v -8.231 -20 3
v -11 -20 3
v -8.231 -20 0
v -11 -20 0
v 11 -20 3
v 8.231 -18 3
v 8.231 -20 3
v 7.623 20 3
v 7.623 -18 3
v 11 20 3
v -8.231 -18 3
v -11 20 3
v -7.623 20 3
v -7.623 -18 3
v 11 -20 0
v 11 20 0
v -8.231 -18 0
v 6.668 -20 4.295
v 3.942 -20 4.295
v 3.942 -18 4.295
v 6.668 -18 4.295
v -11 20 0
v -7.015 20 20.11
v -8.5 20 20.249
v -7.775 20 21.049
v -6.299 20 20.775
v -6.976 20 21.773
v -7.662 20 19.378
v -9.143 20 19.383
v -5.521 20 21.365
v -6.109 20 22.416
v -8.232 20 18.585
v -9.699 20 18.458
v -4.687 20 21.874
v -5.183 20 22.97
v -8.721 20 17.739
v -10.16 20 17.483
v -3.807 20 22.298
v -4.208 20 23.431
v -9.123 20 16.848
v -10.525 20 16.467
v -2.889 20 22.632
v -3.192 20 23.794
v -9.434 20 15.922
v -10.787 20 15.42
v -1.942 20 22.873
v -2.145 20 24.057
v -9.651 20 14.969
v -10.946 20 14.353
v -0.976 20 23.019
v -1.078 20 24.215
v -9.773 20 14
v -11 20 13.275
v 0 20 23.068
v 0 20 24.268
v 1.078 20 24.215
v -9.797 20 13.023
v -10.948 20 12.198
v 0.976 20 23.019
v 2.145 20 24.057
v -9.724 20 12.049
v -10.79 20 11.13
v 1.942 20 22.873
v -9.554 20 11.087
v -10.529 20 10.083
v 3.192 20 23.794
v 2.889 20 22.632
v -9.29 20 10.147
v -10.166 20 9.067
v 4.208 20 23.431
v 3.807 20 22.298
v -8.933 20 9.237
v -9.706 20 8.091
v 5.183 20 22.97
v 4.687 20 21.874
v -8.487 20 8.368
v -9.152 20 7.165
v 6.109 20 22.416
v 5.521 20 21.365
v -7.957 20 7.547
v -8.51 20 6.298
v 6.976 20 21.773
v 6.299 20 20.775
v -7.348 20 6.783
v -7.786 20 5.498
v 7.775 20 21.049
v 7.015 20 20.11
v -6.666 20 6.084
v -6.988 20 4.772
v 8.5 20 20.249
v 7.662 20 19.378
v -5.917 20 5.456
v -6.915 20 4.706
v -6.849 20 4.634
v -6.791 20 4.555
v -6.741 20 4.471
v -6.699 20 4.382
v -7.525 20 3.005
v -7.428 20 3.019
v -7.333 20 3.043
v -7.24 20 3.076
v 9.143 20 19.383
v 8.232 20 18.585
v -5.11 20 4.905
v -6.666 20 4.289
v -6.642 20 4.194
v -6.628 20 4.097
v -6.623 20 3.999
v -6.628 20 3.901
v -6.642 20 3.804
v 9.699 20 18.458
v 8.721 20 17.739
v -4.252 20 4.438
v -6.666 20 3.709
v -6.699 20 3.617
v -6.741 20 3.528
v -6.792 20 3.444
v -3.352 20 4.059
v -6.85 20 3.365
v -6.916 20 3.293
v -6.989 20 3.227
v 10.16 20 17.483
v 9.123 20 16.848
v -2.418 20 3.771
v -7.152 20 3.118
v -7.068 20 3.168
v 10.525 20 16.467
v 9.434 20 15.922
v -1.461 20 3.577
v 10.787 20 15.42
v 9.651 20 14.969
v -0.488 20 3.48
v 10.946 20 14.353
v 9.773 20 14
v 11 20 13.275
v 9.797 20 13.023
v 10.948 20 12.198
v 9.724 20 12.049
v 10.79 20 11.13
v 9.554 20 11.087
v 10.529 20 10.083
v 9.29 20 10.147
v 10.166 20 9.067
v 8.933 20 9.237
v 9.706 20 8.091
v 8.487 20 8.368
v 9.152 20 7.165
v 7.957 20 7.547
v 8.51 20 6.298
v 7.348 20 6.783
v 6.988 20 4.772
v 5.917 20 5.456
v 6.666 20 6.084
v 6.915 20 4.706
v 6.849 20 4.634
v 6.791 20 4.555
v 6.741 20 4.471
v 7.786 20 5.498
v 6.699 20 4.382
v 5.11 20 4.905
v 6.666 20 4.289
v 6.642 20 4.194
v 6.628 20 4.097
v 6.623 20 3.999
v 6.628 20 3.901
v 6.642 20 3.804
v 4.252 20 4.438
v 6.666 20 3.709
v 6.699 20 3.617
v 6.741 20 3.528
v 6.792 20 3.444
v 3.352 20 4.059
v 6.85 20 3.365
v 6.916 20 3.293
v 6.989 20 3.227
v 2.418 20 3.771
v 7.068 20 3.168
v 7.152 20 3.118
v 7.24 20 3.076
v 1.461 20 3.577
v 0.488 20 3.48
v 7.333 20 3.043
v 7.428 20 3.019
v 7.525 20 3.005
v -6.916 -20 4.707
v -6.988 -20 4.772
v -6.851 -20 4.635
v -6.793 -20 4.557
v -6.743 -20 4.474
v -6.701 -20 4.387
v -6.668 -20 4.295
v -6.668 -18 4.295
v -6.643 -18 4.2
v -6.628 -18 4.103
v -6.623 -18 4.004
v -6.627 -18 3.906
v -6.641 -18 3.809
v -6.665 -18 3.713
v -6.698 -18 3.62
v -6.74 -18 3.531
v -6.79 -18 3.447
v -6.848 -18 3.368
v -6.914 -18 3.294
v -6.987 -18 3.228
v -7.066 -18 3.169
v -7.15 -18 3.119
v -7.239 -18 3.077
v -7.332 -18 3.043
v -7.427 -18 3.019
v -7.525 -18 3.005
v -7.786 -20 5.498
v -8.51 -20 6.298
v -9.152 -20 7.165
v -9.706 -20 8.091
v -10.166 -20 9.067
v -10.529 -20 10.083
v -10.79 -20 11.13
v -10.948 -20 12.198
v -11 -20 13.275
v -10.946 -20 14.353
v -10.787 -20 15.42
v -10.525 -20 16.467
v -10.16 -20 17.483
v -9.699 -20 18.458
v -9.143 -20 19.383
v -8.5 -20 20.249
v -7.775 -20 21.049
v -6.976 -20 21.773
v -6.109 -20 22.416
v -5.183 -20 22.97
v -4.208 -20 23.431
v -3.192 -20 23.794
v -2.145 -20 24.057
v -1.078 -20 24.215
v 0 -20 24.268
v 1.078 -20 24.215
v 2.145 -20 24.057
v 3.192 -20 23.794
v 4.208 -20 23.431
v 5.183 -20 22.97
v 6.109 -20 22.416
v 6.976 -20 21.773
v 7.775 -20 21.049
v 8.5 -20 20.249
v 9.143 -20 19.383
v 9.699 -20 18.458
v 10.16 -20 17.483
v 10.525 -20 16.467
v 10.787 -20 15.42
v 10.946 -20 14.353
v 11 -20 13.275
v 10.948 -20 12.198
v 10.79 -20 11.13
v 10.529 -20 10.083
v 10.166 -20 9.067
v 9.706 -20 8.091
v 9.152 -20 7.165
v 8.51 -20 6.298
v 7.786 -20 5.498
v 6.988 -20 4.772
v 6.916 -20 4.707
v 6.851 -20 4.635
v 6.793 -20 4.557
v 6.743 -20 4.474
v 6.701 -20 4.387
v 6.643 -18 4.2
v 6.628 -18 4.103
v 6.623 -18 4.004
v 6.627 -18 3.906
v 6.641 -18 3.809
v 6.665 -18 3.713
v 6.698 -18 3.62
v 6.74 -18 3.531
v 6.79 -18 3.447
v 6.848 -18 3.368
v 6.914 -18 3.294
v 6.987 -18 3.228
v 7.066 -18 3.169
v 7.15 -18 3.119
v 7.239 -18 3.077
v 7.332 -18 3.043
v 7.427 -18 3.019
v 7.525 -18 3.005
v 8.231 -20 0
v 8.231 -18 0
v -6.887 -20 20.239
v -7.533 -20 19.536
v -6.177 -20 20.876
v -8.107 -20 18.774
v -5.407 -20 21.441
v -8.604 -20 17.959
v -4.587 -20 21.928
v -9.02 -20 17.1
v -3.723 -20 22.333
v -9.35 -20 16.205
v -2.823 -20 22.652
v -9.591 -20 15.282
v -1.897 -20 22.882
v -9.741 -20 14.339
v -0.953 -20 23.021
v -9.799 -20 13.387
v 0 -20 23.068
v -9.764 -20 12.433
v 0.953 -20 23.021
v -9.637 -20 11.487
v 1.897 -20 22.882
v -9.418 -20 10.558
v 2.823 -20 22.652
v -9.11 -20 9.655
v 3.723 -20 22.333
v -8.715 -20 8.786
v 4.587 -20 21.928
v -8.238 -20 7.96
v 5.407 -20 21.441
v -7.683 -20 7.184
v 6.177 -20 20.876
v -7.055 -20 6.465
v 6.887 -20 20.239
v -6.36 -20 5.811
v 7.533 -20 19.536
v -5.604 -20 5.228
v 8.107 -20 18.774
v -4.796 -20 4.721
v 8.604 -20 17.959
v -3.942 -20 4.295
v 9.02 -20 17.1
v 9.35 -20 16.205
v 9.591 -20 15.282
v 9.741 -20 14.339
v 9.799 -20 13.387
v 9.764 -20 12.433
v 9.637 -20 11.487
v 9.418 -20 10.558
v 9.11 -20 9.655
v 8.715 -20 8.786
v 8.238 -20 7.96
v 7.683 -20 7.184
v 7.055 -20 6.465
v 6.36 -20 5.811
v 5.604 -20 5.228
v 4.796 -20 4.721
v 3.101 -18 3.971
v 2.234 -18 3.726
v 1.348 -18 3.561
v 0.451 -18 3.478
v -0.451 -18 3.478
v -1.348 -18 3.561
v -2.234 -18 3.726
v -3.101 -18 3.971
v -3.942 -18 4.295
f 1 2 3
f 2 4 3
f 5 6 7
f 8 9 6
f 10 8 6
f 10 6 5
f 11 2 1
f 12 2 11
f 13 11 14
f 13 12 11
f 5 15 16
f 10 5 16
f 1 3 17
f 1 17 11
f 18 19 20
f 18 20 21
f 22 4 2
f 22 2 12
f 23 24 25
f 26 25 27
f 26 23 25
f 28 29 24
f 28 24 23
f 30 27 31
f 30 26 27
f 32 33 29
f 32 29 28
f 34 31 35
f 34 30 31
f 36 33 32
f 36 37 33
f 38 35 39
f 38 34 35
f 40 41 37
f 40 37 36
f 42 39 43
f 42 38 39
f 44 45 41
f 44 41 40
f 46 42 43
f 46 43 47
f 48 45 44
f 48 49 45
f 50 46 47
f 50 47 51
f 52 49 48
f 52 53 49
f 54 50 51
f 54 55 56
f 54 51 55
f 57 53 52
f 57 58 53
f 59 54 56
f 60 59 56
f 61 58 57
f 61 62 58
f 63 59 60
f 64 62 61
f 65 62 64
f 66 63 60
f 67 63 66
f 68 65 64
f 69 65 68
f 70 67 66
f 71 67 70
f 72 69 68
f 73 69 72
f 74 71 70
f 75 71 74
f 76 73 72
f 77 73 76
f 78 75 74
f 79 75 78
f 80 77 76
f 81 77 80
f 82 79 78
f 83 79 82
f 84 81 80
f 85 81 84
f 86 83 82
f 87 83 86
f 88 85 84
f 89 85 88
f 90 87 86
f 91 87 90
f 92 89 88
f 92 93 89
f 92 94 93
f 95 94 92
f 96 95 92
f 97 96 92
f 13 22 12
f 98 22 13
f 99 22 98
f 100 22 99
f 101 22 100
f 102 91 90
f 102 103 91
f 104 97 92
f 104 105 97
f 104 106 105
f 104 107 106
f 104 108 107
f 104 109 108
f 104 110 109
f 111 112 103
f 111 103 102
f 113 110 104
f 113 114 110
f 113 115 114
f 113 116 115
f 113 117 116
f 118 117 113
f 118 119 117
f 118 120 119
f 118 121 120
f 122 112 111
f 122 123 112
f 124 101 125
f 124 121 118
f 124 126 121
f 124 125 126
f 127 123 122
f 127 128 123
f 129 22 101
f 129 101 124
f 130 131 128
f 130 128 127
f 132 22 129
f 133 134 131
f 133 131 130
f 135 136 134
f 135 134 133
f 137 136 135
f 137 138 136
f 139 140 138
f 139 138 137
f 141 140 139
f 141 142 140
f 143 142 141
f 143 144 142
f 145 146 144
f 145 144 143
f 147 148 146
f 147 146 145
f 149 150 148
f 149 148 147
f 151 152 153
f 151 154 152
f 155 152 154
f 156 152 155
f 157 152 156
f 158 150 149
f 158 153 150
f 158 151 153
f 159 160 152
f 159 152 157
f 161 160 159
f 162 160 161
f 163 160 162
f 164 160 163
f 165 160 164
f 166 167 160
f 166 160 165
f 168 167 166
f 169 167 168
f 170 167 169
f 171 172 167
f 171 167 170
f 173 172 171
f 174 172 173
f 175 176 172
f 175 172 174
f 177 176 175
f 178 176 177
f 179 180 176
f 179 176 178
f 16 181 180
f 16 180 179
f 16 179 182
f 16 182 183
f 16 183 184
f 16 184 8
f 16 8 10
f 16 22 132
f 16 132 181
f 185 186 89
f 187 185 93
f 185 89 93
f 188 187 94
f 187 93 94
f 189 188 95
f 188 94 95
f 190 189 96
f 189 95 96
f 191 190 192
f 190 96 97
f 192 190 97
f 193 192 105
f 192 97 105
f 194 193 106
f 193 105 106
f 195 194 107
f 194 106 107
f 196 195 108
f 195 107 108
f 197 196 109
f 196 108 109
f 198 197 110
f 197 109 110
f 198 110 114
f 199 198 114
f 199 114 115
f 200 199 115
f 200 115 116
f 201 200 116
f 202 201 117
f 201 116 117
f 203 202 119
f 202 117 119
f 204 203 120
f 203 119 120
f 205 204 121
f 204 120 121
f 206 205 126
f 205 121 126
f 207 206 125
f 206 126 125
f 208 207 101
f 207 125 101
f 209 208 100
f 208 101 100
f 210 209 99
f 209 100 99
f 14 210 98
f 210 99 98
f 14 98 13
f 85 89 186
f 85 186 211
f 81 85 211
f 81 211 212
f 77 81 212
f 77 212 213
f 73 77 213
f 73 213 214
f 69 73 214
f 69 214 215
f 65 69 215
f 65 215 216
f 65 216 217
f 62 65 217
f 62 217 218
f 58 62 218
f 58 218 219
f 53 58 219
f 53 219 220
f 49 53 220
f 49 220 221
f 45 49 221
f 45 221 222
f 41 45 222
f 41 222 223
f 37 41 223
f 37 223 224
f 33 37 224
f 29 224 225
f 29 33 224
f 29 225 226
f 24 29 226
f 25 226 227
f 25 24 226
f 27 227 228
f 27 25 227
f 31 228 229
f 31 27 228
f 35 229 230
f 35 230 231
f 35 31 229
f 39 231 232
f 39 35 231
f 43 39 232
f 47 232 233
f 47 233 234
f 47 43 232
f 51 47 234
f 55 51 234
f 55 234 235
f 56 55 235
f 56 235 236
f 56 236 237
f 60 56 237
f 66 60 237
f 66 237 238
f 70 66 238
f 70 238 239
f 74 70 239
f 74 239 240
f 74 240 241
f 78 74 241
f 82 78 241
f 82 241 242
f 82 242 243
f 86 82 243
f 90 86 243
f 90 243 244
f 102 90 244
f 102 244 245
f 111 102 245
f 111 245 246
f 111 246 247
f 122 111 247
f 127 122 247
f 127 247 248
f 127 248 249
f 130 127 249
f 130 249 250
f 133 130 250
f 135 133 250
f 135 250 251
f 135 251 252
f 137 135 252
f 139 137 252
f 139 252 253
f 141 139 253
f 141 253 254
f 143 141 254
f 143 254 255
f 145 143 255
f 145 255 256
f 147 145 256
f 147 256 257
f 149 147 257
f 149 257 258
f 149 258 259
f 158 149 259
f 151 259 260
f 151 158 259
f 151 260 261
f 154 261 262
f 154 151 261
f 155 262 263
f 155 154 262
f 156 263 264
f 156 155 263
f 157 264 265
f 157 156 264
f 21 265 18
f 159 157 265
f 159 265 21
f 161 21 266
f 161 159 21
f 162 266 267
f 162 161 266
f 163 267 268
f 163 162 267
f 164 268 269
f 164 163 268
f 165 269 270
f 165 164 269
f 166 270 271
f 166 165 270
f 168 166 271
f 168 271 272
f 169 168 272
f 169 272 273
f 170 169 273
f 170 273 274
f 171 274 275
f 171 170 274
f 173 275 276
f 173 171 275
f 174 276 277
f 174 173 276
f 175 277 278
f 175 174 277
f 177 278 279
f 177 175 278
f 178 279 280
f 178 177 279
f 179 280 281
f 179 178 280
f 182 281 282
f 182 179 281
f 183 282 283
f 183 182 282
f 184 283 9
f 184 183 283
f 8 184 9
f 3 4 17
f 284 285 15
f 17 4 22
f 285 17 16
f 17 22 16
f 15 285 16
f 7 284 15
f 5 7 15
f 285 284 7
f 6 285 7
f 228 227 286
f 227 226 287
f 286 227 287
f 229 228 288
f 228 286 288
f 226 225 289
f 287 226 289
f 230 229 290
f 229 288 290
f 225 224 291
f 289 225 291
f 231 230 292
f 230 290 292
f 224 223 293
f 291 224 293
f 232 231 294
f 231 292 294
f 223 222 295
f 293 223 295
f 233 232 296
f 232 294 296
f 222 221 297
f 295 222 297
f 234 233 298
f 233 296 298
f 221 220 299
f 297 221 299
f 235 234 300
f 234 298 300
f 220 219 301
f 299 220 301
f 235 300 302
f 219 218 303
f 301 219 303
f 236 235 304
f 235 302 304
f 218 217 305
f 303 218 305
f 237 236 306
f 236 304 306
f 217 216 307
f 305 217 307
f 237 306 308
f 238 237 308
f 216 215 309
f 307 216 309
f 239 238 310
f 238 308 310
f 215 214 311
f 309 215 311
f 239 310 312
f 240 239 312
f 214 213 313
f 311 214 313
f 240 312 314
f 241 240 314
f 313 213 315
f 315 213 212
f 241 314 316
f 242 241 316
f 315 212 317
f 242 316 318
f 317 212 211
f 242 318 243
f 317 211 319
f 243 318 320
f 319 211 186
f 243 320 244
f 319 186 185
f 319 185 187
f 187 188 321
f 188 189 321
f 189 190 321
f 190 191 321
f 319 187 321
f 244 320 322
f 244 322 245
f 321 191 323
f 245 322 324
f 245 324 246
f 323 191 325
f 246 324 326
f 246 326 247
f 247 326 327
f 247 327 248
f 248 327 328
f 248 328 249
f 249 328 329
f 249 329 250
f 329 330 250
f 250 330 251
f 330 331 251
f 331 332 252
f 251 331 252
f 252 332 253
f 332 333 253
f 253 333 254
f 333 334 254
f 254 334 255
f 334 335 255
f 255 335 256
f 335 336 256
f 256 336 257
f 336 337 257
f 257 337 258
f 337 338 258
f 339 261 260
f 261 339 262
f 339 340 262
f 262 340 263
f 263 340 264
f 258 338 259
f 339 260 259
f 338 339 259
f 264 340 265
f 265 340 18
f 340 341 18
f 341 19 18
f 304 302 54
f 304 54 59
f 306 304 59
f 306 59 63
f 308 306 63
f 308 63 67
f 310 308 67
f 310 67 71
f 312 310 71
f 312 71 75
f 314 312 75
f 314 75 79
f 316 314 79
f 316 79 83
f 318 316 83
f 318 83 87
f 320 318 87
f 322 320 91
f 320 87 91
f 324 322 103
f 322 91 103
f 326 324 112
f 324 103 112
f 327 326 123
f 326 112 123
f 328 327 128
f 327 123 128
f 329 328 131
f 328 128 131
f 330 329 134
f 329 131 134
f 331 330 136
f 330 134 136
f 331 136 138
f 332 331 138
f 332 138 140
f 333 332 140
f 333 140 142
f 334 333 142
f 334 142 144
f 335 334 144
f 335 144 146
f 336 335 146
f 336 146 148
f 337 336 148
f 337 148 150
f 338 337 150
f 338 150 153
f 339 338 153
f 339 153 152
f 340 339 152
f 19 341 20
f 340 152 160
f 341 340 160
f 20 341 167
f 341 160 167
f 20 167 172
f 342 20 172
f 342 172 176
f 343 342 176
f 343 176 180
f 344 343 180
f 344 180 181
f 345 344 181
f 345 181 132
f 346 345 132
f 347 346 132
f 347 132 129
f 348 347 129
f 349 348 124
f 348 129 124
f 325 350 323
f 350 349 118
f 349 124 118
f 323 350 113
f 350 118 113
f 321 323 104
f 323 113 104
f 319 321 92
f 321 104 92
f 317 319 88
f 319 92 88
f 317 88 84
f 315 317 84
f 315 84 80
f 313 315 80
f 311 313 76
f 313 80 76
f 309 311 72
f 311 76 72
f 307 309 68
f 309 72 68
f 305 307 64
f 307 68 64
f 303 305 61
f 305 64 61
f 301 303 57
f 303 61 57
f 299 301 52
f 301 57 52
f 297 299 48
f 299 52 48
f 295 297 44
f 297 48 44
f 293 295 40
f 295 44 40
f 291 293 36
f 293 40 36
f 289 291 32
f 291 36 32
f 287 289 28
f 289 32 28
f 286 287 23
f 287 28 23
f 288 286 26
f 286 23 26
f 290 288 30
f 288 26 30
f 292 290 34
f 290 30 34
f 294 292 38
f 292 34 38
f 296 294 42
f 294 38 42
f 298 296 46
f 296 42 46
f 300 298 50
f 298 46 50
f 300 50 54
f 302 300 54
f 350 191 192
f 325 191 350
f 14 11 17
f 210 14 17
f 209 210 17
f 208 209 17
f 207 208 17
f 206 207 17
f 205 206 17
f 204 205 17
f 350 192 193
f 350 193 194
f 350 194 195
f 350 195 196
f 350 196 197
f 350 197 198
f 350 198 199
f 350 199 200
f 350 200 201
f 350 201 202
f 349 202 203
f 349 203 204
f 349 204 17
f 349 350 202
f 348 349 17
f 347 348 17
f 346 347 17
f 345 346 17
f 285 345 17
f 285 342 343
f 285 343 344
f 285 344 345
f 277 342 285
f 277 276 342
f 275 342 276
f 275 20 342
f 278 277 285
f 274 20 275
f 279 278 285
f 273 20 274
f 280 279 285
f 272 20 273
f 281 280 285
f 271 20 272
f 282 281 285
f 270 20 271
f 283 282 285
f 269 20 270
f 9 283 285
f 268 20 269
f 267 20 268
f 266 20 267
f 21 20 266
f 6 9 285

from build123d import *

# Parameters (mm, degrees)
SKETCH_1_W          = 22
SKETCH_1_H          = 40
EXTRUDE_1_DEPTH     = 3
SKETCH_2_R          = 11
SKETCH_2_R_2        = 9.8
EXTRUDE_2_DEPTH     = 40
FILLET_1_R          = 1
SKETCH_3_W          = 16.462875958
SKETCH_3_H          = 8.59071229
CUT_EXTRUDE_1_DEPTH = 2


with BuildPart() as part:
    # Эскиз1 → Бобышка-Вытянуть1 (new body)
    with BuildSketch(Plane.XY):
        Rectangle(SKETCH_1_W, SKETCH_1_H)
    extrude(amount=EXTRUDE_1_DEPTH)

    # Эскиз2 → Бобышка-Вытянуть2 (add)
    with BuildSketch(Plane(origin=(0, 20, 0), x_dir=(1, 0, 0), z_dir=(0, 1, 0))):
        with Locations((0, -13.26772589)):
            Circle(SKETCH_2_R)
        with Locations(Location((0, -13.26772589, 0), (0, 0, 270))):
            Circle(SKETCH_2_R_2, mode=Mode.SUBTRACT)
    extrude(amount=-EXTRUDE_2_DEPTH)

    # Скругление1
    fillet_1_edges = [part.edges().sort_by_distance(p)[0] for p in [
        (-3.946366055, 0, 3),
        (3.946366055, 0, 3),
    ]]
    fillet(fillet_1_edges, radius=FILLET_1_R)

    # Эскиз3 → Вырез-Вытянуть1 (cut)
    with BuildSketch(Plane.XZ.offset(20)):
        Rectangle(SKETCH_3_W, SKETCH_3_H)
    extrude(amount=-CUT_EXTRUDE_1_DEPTH, mode=Mode.SUBTRACT)


solid = part.part
